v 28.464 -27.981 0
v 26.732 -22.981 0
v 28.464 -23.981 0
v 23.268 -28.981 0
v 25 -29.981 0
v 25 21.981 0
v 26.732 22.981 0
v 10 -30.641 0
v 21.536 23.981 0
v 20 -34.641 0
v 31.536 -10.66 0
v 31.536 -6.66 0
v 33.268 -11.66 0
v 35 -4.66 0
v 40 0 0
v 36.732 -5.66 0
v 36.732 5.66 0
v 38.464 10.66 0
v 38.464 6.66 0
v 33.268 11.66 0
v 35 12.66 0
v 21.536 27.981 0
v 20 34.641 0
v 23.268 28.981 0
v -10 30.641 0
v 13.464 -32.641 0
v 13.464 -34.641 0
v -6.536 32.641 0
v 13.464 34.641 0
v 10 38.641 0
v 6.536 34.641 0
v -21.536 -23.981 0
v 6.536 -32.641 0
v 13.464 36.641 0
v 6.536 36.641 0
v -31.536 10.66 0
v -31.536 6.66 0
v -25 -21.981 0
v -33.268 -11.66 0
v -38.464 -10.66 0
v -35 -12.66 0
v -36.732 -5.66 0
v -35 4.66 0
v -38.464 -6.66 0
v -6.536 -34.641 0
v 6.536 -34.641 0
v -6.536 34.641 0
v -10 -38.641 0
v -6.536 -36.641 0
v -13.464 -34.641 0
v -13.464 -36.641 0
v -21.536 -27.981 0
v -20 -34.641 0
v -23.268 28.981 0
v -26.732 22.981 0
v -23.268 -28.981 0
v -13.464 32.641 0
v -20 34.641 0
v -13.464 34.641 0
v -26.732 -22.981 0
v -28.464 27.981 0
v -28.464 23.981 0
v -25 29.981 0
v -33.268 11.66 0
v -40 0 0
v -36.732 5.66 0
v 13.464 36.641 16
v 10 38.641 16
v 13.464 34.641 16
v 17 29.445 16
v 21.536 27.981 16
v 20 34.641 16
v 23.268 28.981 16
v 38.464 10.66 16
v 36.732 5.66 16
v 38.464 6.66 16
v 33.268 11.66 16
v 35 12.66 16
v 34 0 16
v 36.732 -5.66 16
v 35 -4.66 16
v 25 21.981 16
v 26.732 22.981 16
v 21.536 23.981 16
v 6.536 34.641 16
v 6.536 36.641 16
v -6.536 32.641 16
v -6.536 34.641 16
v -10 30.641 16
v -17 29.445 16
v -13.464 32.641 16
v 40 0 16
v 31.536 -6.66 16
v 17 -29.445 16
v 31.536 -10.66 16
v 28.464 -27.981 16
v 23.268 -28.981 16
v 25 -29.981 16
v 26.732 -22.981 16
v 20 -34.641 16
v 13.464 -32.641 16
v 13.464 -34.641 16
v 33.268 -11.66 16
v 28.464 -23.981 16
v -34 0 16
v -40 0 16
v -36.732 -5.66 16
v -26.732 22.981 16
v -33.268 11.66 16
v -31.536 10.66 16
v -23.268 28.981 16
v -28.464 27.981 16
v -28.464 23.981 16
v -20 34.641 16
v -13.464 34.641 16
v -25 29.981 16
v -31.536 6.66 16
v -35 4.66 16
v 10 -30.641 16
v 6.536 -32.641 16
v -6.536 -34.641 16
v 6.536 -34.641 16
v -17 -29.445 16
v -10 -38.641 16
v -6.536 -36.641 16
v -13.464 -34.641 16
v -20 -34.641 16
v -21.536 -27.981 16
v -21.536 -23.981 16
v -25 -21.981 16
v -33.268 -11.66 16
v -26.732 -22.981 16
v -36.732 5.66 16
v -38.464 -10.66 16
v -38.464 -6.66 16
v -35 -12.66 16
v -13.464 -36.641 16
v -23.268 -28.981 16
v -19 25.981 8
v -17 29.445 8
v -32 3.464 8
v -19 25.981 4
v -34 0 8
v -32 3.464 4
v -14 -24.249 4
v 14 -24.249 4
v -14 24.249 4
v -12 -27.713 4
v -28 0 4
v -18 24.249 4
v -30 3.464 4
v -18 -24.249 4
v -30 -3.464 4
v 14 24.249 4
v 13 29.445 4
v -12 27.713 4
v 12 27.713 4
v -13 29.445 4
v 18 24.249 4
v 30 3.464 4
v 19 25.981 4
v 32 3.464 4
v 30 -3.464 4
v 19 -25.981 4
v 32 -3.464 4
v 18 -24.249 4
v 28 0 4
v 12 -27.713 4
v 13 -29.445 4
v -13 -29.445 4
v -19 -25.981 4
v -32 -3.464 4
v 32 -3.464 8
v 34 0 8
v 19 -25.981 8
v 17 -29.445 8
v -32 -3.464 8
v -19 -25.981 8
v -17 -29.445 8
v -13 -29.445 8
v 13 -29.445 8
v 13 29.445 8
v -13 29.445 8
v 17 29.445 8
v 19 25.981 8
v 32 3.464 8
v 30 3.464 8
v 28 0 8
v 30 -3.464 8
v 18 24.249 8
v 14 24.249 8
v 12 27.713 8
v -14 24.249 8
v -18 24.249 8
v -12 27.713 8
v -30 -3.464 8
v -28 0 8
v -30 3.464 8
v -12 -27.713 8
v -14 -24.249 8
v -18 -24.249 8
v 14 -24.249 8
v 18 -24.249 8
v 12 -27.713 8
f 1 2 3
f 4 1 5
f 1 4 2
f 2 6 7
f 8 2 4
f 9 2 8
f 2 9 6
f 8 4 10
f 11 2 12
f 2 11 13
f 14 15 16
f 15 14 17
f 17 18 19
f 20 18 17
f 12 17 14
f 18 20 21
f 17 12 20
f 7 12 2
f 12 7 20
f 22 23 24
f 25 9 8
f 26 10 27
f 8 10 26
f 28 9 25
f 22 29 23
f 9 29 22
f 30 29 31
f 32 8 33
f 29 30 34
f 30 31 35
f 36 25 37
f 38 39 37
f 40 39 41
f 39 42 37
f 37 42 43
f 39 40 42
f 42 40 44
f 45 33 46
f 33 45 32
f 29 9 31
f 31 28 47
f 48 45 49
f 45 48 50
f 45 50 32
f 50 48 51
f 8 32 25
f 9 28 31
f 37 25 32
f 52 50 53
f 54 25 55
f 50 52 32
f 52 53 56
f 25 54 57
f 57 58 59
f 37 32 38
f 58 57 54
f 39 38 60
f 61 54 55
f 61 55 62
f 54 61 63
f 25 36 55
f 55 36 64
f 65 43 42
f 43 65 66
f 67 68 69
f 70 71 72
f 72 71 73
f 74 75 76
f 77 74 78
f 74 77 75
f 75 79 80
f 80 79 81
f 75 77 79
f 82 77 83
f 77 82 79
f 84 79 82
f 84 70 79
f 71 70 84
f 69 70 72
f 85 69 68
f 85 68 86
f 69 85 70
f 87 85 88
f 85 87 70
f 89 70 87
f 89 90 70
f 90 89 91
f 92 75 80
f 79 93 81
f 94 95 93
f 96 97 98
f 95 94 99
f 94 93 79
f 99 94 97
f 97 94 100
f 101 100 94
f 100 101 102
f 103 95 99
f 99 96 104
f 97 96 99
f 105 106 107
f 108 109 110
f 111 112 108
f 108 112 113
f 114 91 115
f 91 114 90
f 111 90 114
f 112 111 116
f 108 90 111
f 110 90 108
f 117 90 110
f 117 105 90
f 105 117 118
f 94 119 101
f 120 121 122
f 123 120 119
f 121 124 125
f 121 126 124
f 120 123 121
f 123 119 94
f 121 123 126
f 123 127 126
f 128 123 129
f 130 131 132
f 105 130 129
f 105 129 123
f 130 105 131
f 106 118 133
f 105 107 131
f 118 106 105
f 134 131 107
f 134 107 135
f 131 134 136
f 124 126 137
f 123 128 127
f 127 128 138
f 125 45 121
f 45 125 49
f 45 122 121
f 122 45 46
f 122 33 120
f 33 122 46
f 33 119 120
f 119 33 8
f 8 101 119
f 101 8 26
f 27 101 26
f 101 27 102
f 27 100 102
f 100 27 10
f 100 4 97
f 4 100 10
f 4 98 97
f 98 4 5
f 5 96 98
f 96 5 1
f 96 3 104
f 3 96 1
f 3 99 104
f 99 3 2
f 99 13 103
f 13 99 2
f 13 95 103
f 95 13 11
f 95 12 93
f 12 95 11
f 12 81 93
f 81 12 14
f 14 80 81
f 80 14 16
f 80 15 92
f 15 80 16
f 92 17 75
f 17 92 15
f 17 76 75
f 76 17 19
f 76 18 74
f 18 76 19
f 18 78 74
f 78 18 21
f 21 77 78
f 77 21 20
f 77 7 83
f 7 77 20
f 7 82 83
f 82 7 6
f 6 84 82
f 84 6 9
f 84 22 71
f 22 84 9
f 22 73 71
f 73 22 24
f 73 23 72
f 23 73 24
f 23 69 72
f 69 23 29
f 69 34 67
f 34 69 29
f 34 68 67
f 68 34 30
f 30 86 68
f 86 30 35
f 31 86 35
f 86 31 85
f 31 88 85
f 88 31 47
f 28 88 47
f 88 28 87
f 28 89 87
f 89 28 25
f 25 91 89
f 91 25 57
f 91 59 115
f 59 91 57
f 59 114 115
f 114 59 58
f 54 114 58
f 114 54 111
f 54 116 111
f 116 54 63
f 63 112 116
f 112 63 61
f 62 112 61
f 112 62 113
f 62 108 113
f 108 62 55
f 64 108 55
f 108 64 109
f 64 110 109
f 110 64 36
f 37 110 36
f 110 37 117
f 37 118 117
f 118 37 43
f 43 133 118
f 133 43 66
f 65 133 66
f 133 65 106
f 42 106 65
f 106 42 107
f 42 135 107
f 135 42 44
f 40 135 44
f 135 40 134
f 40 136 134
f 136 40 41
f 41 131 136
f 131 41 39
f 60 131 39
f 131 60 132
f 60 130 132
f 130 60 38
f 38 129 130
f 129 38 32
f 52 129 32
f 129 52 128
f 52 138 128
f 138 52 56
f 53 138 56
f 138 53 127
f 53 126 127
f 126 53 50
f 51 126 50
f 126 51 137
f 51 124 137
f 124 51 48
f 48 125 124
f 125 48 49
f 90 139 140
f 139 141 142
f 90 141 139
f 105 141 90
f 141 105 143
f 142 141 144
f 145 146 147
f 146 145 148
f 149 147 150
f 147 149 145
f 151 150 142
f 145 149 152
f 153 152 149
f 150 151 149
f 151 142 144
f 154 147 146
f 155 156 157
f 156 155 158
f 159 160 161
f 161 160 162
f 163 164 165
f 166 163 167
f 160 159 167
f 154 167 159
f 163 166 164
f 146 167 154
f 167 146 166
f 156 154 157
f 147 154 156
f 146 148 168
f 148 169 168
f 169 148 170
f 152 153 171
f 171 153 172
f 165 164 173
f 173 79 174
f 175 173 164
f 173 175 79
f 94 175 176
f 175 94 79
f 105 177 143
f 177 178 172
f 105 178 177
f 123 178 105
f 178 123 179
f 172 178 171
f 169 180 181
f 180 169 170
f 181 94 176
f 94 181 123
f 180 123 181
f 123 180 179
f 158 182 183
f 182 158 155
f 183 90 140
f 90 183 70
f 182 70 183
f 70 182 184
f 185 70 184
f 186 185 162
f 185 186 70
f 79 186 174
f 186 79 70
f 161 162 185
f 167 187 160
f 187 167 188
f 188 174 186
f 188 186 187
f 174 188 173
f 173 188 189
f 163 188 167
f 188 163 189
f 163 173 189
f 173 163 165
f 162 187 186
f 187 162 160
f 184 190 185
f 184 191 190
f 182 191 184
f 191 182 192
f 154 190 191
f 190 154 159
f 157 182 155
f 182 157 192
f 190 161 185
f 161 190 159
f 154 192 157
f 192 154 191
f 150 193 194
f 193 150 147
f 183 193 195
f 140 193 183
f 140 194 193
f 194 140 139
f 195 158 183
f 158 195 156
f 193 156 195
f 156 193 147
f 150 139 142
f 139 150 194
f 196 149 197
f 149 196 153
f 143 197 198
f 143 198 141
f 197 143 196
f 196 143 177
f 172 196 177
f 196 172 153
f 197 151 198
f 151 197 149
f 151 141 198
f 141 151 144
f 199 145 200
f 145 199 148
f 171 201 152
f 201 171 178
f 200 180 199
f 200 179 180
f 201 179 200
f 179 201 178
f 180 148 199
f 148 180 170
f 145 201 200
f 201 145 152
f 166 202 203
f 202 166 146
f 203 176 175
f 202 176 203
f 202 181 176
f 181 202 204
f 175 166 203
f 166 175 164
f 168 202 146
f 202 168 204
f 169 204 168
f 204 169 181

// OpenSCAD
module base() {
    module walls() {
        connector = 4;
        difference() {
            union() {
                circle(40, $fn = 6);
                for (i = [0:60:300]) {
                    rotate(i) translate([40, 0]) rotate(120) translate([10, 0]) rotate(30) circle(connector, $fn = 6);
                }
            }
            for (i = [0:60:300]) {
                rotate(i) translate([40, 0]) rotate(240) translate([10, 0]) rotate(30) circle(connector, $fn = 6);
            }
        }
    }
    union() {
        difference() {
            linear_extrude(16) walls();
            translate([0, 0, 4]) linear_extrude(16) circle(34, $fn = 6);
        }
        for (i = [0:60:300]) {
            rotate(i) translate([32, 0]) linear_extrude(8) circle(4, $fn = 6);
        }
    }
}

if (is_undef($demo)) {
    base();
}
